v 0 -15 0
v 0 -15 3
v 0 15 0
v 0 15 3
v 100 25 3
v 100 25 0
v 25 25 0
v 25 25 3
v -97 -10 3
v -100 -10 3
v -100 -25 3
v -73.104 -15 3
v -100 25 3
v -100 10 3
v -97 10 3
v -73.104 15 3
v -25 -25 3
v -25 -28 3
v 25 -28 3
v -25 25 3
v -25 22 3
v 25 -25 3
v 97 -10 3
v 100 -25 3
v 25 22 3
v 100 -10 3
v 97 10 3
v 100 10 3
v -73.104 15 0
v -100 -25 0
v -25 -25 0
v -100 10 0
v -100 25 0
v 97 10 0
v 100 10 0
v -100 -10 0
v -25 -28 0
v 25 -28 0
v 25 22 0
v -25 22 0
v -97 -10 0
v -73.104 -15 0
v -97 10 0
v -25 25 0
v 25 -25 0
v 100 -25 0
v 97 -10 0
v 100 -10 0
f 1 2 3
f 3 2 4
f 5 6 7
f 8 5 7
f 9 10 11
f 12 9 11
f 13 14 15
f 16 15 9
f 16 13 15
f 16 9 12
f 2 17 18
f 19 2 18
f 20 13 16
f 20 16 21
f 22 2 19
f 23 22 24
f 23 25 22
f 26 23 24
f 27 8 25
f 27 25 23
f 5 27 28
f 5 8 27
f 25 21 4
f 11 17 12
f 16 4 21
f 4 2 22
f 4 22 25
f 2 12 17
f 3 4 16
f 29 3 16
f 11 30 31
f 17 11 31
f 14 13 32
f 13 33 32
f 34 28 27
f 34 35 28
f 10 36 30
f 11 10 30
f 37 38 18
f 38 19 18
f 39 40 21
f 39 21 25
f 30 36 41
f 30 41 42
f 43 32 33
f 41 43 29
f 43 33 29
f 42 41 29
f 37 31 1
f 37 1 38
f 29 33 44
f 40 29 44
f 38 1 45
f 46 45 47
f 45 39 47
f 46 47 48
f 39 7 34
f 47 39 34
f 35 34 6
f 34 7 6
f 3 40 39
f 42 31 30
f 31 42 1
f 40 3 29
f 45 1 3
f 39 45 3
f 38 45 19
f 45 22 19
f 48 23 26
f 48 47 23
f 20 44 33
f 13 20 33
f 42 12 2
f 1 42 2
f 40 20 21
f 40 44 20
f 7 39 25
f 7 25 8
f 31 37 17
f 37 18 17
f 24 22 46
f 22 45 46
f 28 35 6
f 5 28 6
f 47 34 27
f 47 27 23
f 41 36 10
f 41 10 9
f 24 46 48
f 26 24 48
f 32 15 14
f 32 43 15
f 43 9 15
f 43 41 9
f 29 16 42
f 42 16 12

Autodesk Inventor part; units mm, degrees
ref_plane "YZ Plane" through (0, 0, 0) normal (1, 0, 0) x (0, 1, 0)
ref_plane "XZ Plane" through (0, 0, 0) normal (0, 1, 0) x (-1, 0, 0)
ref_plane "XY Plane" through (0, 0, 0) normal (0, 0, 1) x (1, 0, 0)
sketch "스케치1" plane through (0, 0, 0) normal (0, 0, 1) x (1, 0, 0)
  line L0 (-100, -25) -> (100, -25)
  line L1 (100, -25) -> (100, 25)
  line L2 (100, 25) -> (-100, 25)
  line L3 (-100, 25) -> (-100, -25)
  line L4 (-100, -25) -> (100, 25) construction
  line L5 (100, -25) -> (-100, 25) construction
  line L6 (-25, 22) -> (25, 22)
  line L7 (25, 22) -> (25, 28)
  line L8 (25, 28) -> (-25, 28)
  line L9 (-25, 28) -> (-25, 22)
  line L10 (-25, 22) -> (25, 28) construction
  line L11 (25, 22) -> (-25, 28) construction
  line L12 (-103, -10) -> (-97, -10)
  line L13 (-97, -10) -> (-97, 10)
  line L14 (-97, 10) -> (-103, 10)
  line L15 (-103, 10) -> (-103, -10)
  line L16 (-103, -10) -> (-97, 10) construction
  line L17 (-97, -10) -> (-103, 10) construction
  line L18 (97, -10) -> (103, -10)
  line L19 (103, -10) -> (103, 10)
  line L20 (103, 10) -> (97, 10)
  line L21 (97, 10) -> (97, -10)
  line L22 (97, -10) -> (103, 10) construction
  line L23 (103, -10) -> (97, 10) construction
  point P0 (0, 0)
  point P1 (0, 25)
  point P2 (-100, 0)
  point P3 (100, 0)
  point P4 (-100, -10)
  point P5 (100, -10)
  point P6 (100, 10)
  point P7 (25, 25)
  point P8 (-25, 25)
  point P9 (-100, 10)
  dimension "d0" = 50
  dimension "d1" = 200
  dimension "d2" = 50
  dimension "d3" = 3
  dimension "d4" = 20
  dimension "d5" = 20
  dimension "d6" = 3
  dimension "d7" = 3
extrude "돌출1" add sketch "스케치1" along normal blind 3 contours L3 L12 L13 L14 L2 L9 L6 L7 L1 L20 L21 L18 L0
sketch "스케치2" plane through (0, 0, 3) normal (0, 0, 1) x (1, 0, 0)
  line L0 (-25, -22) -> (25, -22)
  line L1 (25, -22) -> (25, -28)
  line L2 (25, -28) -> (-25, -28)
  line L3 (-25, -28) -> (-25, -22)
  line L4 (-100, -25) -> (100, -25) projected
  line L5 (-25, -22) -> (25, -28) construction
  line L6 (25, -22) -> (-25, -28) construction
  point P0 (0, 0)
  point P1 (0, -25)
  point P2 (25, -25)
  point P3 (-25, -25)
  dimension "d10" = 50
  dimension "d11" = 3
extrude "돌출2" add sketch "스케치2" against normal blind 3 contours L4 L1 L2 L3
sketch "스케치3" plane through (0, 0, 3) normal (0, 0, 1) x (1, 0, 0)
  point P0 (0, 0)
sketch "스케치4" plane through (0, 0, 3) normal (0, 0, 1) x (1, 0, 0)
  point P0 (0, 0)
sketch "스케치5" plane through (0, 0, 3) normal (0, 0, 1) x (1, 0, 0)
  line L0 (0, 15) -> (-96.3599, 15)
  line L1 (-96.3599, 15) -> (-96.3599, -15)
  line L2 (-96.3599, -15) -> (0, -15)
  line L3 (0, -15) -> (0, 15)
  line L4 (-73.1041, 15) -> (-73.1041, -15)
  line L5 (-25, 25) -> (-100, 25) projected
  point P0 (0, 0)
  dimension "d14" = 30
  dimension "d15" = 10
extrude "돌출3" cut sketch "스케치5" against normal through all contours L3 L2 L4 L0
properties part number "본체 겉면 레이저 옆판(뚫림) 수정"
